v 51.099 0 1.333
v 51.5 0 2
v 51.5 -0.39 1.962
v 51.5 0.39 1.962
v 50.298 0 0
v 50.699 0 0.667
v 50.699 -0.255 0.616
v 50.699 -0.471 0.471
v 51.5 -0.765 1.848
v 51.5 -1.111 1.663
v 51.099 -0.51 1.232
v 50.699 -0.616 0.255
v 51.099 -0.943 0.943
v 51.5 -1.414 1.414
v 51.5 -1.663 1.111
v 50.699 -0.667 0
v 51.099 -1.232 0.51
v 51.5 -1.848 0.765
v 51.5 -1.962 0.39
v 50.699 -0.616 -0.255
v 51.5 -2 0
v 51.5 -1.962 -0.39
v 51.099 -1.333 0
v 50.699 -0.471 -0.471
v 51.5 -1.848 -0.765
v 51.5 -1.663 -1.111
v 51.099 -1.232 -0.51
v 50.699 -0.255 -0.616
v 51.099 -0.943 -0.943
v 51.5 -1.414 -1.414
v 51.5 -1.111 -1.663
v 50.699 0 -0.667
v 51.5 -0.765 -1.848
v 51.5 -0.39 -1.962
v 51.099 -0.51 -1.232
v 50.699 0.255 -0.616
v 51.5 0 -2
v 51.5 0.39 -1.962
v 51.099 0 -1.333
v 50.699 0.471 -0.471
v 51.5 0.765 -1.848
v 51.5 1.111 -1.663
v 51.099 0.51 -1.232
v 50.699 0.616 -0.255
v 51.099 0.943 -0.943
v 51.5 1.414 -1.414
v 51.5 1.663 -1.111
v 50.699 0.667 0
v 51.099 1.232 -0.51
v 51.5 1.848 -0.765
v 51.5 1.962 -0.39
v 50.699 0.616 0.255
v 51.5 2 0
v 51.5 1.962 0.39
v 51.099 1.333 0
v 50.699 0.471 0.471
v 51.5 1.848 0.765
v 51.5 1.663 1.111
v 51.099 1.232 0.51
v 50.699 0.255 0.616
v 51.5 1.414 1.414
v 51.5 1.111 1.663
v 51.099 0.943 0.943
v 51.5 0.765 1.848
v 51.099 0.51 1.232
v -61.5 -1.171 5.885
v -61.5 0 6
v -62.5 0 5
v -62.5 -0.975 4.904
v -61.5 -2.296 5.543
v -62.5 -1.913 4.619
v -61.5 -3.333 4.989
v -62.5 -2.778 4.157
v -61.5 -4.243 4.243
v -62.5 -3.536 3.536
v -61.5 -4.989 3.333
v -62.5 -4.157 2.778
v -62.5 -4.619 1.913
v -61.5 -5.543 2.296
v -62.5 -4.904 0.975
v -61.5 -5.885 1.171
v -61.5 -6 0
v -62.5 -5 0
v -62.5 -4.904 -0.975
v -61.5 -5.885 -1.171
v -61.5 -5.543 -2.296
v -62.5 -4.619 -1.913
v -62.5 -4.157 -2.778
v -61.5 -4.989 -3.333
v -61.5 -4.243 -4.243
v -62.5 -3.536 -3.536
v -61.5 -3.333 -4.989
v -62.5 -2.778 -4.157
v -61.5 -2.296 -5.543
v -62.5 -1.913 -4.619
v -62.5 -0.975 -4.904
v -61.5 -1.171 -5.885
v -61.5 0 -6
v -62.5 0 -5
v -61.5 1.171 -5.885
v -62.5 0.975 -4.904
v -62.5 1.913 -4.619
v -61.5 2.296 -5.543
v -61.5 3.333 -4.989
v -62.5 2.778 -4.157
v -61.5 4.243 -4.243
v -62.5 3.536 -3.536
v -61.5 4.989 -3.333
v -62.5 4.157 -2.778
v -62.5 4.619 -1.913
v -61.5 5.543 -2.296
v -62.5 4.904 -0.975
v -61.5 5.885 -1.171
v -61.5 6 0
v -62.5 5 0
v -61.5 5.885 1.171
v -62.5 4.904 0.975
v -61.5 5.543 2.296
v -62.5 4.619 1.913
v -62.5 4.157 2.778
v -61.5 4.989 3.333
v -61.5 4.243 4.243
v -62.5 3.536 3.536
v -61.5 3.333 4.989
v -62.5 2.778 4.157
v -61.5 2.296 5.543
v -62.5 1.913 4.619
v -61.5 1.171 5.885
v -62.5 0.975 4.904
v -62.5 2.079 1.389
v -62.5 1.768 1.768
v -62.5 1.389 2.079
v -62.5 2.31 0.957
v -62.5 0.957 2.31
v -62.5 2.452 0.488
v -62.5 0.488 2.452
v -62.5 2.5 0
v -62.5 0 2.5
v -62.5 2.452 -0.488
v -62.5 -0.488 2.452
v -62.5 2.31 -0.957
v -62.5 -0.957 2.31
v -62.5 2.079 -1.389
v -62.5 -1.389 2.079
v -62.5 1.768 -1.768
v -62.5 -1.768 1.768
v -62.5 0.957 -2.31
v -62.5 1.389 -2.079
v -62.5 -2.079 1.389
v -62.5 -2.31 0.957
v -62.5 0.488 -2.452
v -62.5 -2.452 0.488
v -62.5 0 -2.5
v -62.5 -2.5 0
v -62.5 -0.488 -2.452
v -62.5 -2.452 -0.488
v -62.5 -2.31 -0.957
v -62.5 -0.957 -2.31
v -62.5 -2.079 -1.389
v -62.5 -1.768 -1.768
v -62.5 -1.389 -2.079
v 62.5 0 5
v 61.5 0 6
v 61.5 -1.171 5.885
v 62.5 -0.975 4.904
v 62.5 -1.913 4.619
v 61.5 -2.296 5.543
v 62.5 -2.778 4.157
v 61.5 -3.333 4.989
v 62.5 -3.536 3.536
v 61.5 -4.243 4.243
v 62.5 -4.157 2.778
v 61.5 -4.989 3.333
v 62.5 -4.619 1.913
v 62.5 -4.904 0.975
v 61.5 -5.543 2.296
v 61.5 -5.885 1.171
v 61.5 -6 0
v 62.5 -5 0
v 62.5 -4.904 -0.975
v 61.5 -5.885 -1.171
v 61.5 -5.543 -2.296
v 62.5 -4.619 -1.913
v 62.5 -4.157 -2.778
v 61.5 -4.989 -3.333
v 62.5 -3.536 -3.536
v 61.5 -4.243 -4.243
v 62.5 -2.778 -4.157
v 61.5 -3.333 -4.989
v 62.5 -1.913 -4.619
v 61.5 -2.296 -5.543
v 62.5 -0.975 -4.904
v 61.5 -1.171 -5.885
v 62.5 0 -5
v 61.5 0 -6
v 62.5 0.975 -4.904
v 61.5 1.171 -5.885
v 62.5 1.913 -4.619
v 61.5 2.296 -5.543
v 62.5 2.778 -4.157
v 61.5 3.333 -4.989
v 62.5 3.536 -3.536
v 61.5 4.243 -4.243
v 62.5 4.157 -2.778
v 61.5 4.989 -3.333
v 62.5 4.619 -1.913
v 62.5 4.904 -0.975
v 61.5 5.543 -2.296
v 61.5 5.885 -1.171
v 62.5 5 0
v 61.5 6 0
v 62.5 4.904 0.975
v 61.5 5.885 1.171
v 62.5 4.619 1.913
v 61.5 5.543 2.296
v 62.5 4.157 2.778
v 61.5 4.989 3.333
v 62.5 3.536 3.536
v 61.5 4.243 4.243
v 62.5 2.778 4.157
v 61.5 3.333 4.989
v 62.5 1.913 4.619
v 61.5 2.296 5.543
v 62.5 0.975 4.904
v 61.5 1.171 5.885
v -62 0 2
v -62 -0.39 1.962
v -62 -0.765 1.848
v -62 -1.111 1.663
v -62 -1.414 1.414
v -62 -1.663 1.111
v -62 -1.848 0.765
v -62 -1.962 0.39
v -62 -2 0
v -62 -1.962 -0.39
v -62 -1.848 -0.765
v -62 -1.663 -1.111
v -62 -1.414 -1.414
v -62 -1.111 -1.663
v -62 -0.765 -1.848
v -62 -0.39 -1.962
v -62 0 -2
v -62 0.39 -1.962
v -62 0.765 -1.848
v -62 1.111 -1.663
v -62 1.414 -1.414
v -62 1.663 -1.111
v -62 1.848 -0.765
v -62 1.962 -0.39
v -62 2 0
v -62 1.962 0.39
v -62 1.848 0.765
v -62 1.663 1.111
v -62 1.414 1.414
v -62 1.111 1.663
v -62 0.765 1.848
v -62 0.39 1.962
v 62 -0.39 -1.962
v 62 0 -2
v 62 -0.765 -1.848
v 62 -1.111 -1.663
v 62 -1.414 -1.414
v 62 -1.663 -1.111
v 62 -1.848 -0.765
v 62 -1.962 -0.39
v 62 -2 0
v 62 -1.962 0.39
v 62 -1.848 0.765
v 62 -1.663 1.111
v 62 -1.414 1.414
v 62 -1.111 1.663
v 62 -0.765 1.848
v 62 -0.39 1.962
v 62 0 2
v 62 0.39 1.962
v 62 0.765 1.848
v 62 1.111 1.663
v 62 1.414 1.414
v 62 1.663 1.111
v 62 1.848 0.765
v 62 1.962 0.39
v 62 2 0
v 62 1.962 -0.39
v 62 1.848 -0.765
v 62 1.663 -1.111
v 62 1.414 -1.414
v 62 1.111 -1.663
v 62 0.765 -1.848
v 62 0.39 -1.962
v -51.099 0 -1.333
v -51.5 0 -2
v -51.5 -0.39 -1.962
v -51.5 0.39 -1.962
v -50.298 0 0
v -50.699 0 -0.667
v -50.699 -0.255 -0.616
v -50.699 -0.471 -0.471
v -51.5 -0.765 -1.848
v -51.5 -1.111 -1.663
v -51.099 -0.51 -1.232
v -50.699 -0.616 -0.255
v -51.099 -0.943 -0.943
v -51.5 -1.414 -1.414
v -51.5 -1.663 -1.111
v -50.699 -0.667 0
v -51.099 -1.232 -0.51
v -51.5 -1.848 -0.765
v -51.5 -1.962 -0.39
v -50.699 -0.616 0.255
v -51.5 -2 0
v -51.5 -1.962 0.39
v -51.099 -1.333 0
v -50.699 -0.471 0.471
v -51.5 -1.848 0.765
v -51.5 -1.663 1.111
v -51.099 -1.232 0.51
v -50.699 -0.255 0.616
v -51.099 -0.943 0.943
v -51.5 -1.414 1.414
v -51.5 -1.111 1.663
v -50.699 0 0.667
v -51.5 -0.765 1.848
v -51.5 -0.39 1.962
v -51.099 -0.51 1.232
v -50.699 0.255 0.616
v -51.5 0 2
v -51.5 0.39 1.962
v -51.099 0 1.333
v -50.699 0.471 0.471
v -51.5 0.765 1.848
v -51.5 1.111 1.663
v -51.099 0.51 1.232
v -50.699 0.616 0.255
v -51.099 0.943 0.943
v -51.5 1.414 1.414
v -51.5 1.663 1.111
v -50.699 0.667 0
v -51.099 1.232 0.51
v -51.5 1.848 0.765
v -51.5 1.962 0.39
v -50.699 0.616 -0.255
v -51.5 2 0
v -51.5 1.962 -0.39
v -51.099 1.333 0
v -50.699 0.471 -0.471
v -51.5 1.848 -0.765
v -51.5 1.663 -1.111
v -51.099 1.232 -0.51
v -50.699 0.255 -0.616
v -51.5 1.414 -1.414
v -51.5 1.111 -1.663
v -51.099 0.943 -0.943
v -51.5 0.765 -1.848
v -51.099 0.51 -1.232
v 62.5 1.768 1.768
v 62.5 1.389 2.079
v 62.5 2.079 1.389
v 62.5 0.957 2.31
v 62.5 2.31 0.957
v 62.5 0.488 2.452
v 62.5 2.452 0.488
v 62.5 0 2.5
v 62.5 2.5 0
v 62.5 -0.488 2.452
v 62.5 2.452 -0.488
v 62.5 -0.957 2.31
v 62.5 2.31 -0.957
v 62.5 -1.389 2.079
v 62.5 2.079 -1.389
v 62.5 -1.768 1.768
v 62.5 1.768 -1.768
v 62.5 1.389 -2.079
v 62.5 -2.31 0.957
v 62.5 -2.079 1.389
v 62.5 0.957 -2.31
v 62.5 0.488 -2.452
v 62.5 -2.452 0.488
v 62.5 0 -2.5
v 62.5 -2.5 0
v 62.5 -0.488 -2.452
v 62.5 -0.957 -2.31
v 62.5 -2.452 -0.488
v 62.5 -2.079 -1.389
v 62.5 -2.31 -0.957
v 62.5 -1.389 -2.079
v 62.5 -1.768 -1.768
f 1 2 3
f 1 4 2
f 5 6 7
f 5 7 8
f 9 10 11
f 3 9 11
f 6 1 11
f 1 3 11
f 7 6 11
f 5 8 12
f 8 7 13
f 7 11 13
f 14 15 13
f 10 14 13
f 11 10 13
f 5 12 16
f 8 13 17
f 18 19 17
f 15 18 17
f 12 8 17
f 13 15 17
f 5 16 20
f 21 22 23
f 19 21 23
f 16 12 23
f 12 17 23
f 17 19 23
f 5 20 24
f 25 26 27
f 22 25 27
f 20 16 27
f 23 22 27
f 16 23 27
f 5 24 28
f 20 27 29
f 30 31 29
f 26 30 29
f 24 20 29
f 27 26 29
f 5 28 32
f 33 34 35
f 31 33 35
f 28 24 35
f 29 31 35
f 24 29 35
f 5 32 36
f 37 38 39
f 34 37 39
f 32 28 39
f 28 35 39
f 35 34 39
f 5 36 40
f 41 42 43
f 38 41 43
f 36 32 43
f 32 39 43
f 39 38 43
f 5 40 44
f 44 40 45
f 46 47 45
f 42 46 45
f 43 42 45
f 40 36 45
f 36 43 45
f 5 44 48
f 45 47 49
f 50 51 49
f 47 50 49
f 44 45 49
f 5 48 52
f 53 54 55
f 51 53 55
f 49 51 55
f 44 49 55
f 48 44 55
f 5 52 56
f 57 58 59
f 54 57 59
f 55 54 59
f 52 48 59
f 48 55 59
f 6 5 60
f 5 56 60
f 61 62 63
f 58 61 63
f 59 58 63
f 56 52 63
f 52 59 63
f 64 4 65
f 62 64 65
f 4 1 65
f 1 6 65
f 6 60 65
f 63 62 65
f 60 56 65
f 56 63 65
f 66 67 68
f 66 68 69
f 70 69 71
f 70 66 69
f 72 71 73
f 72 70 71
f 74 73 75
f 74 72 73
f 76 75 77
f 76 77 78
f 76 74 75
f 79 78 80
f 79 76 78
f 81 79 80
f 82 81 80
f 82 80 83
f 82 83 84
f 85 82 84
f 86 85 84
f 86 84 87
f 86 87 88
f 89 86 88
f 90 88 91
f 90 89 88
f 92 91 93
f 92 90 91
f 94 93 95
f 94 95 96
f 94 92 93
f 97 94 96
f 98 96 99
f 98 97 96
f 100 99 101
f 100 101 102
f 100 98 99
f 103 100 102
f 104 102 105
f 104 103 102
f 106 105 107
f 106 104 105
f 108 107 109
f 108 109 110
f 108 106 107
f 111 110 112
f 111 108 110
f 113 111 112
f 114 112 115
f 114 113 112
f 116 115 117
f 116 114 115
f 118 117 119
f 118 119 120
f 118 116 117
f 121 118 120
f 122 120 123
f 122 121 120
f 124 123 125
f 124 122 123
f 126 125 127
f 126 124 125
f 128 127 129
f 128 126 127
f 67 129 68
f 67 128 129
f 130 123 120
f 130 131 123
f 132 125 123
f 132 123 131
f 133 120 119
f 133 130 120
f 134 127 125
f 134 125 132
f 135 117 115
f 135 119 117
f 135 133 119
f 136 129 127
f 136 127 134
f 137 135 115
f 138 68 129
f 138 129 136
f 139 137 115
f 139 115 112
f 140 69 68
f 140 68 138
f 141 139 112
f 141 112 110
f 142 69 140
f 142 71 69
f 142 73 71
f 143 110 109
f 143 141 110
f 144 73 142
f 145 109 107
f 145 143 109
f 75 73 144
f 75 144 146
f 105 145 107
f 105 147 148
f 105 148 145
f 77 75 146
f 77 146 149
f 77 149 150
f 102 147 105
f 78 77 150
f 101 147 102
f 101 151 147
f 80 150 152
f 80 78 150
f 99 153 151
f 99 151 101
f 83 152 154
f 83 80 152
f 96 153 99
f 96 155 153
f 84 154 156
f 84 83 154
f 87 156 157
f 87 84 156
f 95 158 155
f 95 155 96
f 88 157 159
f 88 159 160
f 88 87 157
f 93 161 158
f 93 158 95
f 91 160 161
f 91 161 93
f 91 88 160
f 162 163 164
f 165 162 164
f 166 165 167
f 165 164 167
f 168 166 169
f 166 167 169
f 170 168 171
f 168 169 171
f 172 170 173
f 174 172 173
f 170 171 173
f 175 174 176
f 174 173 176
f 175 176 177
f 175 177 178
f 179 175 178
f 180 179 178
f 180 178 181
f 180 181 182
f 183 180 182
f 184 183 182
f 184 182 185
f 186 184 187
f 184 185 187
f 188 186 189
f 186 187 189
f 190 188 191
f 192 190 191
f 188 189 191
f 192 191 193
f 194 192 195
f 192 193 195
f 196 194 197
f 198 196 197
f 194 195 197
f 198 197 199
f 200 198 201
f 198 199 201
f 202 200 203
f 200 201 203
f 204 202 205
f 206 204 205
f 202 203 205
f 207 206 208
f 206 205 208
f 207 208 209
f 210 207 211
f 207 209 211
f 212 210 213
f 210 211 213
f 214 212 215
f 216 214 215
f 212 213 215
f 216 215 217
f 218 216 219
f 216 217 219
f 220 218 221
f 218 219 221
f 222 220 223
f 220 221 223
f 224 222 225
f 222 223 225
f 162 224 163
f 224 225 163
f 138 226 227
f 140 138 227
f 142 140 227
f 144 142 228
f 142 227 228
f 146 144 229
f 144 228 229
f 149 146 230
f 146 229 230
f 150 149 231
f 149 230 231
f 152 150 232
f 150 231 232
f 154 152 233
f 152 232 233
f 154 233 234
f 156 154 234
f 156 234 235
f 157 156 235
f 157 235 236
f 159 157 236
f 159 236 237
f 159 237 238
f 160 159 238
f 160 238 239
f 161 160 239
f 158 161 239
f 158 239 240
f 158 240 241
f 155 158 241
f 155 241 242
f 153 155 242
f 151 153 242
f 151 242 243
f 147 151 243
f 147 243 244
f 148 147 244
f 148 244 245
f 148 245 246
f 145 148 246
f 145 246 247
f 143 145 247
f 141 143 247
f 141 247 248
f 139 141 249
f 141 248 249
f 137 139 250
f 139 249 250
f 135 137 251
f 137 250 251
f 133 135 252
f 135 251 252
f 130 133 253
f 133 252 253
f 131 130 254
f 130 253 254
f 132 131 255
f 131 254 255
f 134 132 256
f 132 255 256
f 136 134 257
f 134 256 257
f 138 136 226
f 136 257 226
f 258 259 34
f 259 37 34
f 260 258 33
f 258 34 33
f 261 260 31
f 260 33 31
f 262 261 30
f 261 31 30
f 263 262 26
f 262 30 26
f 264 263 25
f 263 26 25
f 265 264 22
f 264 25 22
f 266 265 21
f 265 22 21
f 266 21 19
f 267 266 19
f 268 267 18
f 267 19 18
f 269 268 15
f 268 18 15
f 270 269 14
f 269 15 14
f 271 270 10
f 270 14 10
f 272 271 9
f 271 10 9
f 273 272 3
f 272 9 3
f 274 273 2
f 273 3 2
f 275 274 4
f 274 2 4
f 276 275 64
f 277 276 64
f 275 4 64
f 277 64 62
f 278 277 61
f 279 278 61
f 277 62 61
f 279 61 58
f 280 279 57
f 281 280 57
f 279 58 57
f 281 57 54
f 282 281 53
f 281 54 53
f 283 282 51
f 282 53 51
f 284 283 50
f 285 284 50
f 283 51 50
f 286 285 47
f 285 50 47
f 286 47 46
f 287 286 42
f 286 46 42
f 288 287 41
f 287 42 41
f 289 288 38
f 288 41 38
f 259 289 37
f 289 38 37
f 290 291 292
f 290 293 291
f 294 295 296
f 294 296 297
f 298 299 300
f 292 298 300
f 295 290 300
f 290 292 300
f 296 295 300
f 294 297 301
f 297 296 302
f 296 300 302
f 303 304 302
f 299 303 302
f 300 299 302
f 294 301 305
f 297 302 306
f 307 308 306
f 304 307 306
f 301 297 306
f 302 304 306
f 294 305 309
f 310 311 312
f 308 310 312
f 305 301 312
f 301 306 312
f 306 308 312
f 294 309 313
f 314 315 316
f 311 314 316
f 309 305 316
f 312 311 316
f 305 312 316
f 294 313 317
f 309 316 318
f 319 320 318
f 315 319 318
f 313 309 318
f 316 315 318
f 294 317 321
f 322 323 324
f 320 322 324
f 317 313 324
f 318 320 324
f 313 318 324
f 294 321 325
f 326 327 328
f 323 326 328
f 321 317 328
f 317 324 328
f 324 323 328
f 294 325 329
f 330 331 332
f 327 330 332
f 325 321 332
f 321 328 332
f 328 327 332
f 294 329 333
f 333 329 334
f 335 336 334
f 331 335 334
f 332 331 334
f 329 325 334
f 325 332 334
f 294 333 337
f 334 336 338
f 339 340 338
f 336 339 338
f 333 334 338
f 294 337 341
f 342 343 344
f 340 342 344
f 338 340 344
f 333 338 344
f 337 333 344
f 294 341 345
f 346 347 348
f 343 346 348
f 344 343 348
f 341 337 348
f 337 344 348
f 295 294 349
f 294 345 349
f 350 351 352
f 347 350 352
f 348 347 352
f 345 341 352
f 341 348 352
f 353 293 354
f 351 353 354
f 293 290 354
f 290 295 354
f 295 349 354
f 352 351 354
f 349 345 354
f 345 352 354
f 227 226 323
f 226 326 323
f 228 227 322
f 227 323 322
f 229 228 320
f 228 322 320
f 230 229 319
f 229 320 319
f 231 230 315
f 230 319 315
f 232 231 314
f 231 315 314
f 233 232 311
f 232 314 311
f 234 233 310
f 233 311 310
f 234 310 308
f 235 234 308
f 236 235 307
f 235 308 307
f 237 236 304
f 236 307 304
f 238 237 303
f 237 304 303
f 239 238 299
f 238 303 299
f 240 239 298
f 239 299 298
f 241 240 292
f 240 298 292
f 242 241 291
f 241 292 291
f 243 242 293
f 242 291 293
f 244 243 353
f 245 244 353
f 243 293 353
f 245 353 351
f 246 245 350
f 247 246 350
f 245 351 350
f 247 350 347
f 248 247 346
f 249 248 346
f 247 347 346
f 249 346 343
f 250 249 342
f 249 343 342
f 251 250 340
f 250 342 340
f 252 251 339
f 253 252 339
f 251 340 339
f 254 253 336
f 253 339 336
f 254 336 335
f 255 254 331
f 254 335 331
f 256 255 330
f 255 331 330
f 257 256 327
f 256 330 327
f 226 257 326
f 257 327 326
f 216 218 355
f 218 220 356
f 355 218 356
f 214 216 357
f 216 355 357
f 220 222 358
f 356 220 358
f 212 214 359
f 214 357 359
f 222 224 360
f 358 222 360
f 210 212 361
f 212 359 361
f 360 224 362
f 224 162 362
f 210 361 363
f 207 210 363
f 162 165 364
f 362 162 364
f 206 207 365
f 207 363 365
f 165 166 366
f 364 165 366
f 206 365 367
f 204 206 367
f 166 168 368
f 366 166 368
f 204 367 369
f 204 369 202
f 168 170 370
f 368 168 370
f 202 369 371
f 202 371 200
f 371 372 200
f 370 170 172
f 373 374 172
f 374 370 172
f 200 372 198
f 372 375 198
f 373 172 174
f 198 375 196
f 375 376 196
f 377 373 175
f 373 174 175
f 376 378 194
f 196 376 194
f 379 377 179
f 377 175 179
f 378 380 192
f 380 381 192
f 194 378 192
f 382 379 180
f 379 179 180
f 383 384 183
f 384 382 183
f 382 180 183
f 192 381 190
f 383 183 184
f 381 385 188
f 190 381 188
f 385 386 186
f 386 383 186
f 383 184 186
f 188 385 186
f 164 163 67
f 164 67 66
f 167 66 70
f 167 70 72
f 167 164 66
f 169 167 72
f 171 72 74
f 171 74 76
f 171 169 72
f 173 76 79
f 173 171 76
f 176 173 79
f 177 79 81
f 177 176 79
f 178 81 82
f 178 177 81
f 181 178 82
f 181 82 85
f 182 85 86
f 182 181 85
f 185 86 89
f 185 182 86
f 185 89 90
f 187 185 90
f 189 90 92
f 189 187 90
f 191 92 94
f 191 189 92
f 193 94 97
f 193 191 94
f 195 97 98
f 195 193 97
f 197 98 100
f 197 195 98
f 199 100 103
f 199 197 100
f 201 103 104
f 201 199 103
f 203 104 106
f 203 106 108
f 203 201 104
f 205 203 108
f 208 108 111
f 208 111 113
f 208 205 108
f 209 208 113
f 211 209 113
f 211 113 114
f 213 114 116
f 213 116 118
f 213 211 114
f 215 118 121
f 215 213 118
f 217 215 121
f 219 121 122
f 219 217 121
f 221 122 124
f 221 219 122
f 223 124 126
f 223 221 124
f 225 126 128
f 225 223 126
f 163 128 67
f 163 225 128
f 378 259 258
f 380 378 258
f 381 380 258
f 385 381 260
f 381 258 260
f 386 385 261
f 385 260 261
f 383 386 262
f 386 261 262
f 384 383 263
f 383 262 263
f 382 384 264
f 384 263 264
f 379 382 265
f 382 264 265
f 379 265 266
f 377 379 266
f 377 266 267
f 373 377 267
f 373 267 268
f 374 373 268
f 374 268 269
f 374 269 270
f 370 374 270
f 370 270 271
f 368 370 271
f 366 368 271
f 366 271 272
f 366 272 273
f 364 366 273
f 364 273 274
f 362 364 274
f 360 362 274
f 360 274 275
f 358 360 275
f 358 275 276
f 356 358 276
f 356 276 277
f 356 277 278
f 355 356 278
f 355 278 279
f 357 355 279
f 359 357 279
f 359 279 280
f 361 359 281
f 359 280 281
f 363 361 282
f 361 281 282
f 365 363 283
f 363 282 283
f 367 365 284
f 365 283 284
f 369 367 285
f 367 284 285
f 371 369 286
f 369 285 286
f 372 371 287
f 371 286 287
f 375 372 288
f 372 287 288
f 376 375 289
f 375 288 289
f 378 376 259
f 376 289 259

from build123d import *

# Parameters (mm, degrees)
ESQUISSE1_W                                       = 125
ESQUISSE1_H                                       = 6
CHANFREIN1_SIZE                                   = 1
DIAM_TRE_DU_PER_AGE_4_0_4_1_D                     = 4
DIAM_TRE_DU_PER_AGE_4_0_4_1_DEPTH                 = 11
DIAM_TRE_DU_PER_AGE_4_0_4_1_CSINK_D               = 5
DIAM_TRE_DU_PER_AGE_4_0_4_1_CSINK_ANGLE           = 90
DIAM_TRE_DU_PER_AGE_4_0_4_1_TIP                   = 1.201721238
DIAM_TRE_DU_PER_AGE_4_0_4_1_ON_FACE_2_D           = 4
DIAM_TRE_DU_PER_AGE_4_0_4_1_ON_FACE_2_DEPTH       = 11
DIAM_TRE_DU_PER_AGE_4_0_4_1_ON_FACE_2_CSINK_D     = 5
DIAM_TRE_DU_PER_AGE_4_0_4_1_ON_FACE_2_CSINK_ANGLE = 90
DIAM_TRE_DU_PER_AGE_4_0_4_1_ON_FACE_2_TIP         = 1.201721238


with BuildPart() as part:
    # Esquisse1 → Révolution1 (revolve)
    with BuildSketch(Plane.XY, mode=Mode.PRIVATE) as r_volution1_sk:
        with Locations((0, 3)):
            Rectangle(ESQUISSE1_W, ESQUISSE1_H)
    revolve(r_volution1_sk.sketch.rotate(Axis((-35.682971619, 0, 0), (1, 0, 0)), 90), axis=Axis((-35.682971619, 0, 0), (1, 0, 0)))

    # Chanfrein1
    chanfrein1_edges = [part.edges().sort_by_distance(p)[0] for p in [
        (62.5, 0, -6),
        (-62.5, 0, -6),
    ]]
    chamfer(chanfrein1_edges, length=CHANFREIN1_SIZE)

    # Diamètre du perçage Ø4.0 (4)1
    with Locations(Plane(origin=(62.5, 0, 0), x_dir=(0, 0, 1), z_dir=(1, 0, 0))):
        with Locations((0, 0)):
            CounterSinkHole(DIAM_TRE_DU_PER_AGE_4_0_4_1_D / 2, DIAM_TRE_DU_PER_AGE_4_0_4_1_CSINK_D / 2, depth=DIAM_TRE_DU_PER_AGE_4_0_4_1_DEPTH, counter_sink_angle=DIAM_TRE_DU_PER_AGE_4_0_4_1_CSINK_ANGLE)
            with Locations((0, 0, -(DIAM_TRE_DU_PER_AGE_4_0_4_1_DEPTH + DIAM_TRE_DU_PER_AGE_4_0_4_1_TIP / 2))):  # 118° drill point
                Cone(0, DIAM_TRE_DU_PER_AGE_4_0_4_1_D / 2, DIAM_TRE_DU_PER_AGE_4_0_4_1_TIP, mode=Mode.SUBTRACT)

    # Diamètre du perçage Ø4.0 (4)1 on face 2
    with Locations(Plane(origin=(-62.5, 0, 0), x_dir=(0, 0, -1), z_dir=(-1, 0, 0))):
        with Locations((0, 0)):
            CounterSinkHole(DIAM_TRE_DU_PER_AGE_4_0_4_1_ON_FACE_2_D / 2, DIAM_TRE_DU_PER_AGE_4_0_4_1_ON_FACE_2_CSINK_D / 2, depth=DIAM_TRE_DU_PER_AGE_4_0_4_1_ON_FACE_2_DEPTH, counter_sink_angle=DIAM_TRE_DU_PER_AGE_4_0_4_1_ON_FACE_2_CSINK_ANGLE)
            with Locations((0, 0, -(DIAM_TRE_DU_PER_AGE_4_0_4_1_ON_FACE_2_DEPTH + DIAM_TRE_DU_PER_AGE_4_0_4_1_ON_FACE_2_TIP / 2))):  # 118° drill point
                Cone(0, DIAM_TRE_DU_PER_AGE_4_0_4_1_ON_FACE_2_D / 2, DIAM_TRE_DU_PER_AGE_4_0_4_1_ON_FACE_2_TIP, mode=Mode.SUBTRACT)


solid = part.part
